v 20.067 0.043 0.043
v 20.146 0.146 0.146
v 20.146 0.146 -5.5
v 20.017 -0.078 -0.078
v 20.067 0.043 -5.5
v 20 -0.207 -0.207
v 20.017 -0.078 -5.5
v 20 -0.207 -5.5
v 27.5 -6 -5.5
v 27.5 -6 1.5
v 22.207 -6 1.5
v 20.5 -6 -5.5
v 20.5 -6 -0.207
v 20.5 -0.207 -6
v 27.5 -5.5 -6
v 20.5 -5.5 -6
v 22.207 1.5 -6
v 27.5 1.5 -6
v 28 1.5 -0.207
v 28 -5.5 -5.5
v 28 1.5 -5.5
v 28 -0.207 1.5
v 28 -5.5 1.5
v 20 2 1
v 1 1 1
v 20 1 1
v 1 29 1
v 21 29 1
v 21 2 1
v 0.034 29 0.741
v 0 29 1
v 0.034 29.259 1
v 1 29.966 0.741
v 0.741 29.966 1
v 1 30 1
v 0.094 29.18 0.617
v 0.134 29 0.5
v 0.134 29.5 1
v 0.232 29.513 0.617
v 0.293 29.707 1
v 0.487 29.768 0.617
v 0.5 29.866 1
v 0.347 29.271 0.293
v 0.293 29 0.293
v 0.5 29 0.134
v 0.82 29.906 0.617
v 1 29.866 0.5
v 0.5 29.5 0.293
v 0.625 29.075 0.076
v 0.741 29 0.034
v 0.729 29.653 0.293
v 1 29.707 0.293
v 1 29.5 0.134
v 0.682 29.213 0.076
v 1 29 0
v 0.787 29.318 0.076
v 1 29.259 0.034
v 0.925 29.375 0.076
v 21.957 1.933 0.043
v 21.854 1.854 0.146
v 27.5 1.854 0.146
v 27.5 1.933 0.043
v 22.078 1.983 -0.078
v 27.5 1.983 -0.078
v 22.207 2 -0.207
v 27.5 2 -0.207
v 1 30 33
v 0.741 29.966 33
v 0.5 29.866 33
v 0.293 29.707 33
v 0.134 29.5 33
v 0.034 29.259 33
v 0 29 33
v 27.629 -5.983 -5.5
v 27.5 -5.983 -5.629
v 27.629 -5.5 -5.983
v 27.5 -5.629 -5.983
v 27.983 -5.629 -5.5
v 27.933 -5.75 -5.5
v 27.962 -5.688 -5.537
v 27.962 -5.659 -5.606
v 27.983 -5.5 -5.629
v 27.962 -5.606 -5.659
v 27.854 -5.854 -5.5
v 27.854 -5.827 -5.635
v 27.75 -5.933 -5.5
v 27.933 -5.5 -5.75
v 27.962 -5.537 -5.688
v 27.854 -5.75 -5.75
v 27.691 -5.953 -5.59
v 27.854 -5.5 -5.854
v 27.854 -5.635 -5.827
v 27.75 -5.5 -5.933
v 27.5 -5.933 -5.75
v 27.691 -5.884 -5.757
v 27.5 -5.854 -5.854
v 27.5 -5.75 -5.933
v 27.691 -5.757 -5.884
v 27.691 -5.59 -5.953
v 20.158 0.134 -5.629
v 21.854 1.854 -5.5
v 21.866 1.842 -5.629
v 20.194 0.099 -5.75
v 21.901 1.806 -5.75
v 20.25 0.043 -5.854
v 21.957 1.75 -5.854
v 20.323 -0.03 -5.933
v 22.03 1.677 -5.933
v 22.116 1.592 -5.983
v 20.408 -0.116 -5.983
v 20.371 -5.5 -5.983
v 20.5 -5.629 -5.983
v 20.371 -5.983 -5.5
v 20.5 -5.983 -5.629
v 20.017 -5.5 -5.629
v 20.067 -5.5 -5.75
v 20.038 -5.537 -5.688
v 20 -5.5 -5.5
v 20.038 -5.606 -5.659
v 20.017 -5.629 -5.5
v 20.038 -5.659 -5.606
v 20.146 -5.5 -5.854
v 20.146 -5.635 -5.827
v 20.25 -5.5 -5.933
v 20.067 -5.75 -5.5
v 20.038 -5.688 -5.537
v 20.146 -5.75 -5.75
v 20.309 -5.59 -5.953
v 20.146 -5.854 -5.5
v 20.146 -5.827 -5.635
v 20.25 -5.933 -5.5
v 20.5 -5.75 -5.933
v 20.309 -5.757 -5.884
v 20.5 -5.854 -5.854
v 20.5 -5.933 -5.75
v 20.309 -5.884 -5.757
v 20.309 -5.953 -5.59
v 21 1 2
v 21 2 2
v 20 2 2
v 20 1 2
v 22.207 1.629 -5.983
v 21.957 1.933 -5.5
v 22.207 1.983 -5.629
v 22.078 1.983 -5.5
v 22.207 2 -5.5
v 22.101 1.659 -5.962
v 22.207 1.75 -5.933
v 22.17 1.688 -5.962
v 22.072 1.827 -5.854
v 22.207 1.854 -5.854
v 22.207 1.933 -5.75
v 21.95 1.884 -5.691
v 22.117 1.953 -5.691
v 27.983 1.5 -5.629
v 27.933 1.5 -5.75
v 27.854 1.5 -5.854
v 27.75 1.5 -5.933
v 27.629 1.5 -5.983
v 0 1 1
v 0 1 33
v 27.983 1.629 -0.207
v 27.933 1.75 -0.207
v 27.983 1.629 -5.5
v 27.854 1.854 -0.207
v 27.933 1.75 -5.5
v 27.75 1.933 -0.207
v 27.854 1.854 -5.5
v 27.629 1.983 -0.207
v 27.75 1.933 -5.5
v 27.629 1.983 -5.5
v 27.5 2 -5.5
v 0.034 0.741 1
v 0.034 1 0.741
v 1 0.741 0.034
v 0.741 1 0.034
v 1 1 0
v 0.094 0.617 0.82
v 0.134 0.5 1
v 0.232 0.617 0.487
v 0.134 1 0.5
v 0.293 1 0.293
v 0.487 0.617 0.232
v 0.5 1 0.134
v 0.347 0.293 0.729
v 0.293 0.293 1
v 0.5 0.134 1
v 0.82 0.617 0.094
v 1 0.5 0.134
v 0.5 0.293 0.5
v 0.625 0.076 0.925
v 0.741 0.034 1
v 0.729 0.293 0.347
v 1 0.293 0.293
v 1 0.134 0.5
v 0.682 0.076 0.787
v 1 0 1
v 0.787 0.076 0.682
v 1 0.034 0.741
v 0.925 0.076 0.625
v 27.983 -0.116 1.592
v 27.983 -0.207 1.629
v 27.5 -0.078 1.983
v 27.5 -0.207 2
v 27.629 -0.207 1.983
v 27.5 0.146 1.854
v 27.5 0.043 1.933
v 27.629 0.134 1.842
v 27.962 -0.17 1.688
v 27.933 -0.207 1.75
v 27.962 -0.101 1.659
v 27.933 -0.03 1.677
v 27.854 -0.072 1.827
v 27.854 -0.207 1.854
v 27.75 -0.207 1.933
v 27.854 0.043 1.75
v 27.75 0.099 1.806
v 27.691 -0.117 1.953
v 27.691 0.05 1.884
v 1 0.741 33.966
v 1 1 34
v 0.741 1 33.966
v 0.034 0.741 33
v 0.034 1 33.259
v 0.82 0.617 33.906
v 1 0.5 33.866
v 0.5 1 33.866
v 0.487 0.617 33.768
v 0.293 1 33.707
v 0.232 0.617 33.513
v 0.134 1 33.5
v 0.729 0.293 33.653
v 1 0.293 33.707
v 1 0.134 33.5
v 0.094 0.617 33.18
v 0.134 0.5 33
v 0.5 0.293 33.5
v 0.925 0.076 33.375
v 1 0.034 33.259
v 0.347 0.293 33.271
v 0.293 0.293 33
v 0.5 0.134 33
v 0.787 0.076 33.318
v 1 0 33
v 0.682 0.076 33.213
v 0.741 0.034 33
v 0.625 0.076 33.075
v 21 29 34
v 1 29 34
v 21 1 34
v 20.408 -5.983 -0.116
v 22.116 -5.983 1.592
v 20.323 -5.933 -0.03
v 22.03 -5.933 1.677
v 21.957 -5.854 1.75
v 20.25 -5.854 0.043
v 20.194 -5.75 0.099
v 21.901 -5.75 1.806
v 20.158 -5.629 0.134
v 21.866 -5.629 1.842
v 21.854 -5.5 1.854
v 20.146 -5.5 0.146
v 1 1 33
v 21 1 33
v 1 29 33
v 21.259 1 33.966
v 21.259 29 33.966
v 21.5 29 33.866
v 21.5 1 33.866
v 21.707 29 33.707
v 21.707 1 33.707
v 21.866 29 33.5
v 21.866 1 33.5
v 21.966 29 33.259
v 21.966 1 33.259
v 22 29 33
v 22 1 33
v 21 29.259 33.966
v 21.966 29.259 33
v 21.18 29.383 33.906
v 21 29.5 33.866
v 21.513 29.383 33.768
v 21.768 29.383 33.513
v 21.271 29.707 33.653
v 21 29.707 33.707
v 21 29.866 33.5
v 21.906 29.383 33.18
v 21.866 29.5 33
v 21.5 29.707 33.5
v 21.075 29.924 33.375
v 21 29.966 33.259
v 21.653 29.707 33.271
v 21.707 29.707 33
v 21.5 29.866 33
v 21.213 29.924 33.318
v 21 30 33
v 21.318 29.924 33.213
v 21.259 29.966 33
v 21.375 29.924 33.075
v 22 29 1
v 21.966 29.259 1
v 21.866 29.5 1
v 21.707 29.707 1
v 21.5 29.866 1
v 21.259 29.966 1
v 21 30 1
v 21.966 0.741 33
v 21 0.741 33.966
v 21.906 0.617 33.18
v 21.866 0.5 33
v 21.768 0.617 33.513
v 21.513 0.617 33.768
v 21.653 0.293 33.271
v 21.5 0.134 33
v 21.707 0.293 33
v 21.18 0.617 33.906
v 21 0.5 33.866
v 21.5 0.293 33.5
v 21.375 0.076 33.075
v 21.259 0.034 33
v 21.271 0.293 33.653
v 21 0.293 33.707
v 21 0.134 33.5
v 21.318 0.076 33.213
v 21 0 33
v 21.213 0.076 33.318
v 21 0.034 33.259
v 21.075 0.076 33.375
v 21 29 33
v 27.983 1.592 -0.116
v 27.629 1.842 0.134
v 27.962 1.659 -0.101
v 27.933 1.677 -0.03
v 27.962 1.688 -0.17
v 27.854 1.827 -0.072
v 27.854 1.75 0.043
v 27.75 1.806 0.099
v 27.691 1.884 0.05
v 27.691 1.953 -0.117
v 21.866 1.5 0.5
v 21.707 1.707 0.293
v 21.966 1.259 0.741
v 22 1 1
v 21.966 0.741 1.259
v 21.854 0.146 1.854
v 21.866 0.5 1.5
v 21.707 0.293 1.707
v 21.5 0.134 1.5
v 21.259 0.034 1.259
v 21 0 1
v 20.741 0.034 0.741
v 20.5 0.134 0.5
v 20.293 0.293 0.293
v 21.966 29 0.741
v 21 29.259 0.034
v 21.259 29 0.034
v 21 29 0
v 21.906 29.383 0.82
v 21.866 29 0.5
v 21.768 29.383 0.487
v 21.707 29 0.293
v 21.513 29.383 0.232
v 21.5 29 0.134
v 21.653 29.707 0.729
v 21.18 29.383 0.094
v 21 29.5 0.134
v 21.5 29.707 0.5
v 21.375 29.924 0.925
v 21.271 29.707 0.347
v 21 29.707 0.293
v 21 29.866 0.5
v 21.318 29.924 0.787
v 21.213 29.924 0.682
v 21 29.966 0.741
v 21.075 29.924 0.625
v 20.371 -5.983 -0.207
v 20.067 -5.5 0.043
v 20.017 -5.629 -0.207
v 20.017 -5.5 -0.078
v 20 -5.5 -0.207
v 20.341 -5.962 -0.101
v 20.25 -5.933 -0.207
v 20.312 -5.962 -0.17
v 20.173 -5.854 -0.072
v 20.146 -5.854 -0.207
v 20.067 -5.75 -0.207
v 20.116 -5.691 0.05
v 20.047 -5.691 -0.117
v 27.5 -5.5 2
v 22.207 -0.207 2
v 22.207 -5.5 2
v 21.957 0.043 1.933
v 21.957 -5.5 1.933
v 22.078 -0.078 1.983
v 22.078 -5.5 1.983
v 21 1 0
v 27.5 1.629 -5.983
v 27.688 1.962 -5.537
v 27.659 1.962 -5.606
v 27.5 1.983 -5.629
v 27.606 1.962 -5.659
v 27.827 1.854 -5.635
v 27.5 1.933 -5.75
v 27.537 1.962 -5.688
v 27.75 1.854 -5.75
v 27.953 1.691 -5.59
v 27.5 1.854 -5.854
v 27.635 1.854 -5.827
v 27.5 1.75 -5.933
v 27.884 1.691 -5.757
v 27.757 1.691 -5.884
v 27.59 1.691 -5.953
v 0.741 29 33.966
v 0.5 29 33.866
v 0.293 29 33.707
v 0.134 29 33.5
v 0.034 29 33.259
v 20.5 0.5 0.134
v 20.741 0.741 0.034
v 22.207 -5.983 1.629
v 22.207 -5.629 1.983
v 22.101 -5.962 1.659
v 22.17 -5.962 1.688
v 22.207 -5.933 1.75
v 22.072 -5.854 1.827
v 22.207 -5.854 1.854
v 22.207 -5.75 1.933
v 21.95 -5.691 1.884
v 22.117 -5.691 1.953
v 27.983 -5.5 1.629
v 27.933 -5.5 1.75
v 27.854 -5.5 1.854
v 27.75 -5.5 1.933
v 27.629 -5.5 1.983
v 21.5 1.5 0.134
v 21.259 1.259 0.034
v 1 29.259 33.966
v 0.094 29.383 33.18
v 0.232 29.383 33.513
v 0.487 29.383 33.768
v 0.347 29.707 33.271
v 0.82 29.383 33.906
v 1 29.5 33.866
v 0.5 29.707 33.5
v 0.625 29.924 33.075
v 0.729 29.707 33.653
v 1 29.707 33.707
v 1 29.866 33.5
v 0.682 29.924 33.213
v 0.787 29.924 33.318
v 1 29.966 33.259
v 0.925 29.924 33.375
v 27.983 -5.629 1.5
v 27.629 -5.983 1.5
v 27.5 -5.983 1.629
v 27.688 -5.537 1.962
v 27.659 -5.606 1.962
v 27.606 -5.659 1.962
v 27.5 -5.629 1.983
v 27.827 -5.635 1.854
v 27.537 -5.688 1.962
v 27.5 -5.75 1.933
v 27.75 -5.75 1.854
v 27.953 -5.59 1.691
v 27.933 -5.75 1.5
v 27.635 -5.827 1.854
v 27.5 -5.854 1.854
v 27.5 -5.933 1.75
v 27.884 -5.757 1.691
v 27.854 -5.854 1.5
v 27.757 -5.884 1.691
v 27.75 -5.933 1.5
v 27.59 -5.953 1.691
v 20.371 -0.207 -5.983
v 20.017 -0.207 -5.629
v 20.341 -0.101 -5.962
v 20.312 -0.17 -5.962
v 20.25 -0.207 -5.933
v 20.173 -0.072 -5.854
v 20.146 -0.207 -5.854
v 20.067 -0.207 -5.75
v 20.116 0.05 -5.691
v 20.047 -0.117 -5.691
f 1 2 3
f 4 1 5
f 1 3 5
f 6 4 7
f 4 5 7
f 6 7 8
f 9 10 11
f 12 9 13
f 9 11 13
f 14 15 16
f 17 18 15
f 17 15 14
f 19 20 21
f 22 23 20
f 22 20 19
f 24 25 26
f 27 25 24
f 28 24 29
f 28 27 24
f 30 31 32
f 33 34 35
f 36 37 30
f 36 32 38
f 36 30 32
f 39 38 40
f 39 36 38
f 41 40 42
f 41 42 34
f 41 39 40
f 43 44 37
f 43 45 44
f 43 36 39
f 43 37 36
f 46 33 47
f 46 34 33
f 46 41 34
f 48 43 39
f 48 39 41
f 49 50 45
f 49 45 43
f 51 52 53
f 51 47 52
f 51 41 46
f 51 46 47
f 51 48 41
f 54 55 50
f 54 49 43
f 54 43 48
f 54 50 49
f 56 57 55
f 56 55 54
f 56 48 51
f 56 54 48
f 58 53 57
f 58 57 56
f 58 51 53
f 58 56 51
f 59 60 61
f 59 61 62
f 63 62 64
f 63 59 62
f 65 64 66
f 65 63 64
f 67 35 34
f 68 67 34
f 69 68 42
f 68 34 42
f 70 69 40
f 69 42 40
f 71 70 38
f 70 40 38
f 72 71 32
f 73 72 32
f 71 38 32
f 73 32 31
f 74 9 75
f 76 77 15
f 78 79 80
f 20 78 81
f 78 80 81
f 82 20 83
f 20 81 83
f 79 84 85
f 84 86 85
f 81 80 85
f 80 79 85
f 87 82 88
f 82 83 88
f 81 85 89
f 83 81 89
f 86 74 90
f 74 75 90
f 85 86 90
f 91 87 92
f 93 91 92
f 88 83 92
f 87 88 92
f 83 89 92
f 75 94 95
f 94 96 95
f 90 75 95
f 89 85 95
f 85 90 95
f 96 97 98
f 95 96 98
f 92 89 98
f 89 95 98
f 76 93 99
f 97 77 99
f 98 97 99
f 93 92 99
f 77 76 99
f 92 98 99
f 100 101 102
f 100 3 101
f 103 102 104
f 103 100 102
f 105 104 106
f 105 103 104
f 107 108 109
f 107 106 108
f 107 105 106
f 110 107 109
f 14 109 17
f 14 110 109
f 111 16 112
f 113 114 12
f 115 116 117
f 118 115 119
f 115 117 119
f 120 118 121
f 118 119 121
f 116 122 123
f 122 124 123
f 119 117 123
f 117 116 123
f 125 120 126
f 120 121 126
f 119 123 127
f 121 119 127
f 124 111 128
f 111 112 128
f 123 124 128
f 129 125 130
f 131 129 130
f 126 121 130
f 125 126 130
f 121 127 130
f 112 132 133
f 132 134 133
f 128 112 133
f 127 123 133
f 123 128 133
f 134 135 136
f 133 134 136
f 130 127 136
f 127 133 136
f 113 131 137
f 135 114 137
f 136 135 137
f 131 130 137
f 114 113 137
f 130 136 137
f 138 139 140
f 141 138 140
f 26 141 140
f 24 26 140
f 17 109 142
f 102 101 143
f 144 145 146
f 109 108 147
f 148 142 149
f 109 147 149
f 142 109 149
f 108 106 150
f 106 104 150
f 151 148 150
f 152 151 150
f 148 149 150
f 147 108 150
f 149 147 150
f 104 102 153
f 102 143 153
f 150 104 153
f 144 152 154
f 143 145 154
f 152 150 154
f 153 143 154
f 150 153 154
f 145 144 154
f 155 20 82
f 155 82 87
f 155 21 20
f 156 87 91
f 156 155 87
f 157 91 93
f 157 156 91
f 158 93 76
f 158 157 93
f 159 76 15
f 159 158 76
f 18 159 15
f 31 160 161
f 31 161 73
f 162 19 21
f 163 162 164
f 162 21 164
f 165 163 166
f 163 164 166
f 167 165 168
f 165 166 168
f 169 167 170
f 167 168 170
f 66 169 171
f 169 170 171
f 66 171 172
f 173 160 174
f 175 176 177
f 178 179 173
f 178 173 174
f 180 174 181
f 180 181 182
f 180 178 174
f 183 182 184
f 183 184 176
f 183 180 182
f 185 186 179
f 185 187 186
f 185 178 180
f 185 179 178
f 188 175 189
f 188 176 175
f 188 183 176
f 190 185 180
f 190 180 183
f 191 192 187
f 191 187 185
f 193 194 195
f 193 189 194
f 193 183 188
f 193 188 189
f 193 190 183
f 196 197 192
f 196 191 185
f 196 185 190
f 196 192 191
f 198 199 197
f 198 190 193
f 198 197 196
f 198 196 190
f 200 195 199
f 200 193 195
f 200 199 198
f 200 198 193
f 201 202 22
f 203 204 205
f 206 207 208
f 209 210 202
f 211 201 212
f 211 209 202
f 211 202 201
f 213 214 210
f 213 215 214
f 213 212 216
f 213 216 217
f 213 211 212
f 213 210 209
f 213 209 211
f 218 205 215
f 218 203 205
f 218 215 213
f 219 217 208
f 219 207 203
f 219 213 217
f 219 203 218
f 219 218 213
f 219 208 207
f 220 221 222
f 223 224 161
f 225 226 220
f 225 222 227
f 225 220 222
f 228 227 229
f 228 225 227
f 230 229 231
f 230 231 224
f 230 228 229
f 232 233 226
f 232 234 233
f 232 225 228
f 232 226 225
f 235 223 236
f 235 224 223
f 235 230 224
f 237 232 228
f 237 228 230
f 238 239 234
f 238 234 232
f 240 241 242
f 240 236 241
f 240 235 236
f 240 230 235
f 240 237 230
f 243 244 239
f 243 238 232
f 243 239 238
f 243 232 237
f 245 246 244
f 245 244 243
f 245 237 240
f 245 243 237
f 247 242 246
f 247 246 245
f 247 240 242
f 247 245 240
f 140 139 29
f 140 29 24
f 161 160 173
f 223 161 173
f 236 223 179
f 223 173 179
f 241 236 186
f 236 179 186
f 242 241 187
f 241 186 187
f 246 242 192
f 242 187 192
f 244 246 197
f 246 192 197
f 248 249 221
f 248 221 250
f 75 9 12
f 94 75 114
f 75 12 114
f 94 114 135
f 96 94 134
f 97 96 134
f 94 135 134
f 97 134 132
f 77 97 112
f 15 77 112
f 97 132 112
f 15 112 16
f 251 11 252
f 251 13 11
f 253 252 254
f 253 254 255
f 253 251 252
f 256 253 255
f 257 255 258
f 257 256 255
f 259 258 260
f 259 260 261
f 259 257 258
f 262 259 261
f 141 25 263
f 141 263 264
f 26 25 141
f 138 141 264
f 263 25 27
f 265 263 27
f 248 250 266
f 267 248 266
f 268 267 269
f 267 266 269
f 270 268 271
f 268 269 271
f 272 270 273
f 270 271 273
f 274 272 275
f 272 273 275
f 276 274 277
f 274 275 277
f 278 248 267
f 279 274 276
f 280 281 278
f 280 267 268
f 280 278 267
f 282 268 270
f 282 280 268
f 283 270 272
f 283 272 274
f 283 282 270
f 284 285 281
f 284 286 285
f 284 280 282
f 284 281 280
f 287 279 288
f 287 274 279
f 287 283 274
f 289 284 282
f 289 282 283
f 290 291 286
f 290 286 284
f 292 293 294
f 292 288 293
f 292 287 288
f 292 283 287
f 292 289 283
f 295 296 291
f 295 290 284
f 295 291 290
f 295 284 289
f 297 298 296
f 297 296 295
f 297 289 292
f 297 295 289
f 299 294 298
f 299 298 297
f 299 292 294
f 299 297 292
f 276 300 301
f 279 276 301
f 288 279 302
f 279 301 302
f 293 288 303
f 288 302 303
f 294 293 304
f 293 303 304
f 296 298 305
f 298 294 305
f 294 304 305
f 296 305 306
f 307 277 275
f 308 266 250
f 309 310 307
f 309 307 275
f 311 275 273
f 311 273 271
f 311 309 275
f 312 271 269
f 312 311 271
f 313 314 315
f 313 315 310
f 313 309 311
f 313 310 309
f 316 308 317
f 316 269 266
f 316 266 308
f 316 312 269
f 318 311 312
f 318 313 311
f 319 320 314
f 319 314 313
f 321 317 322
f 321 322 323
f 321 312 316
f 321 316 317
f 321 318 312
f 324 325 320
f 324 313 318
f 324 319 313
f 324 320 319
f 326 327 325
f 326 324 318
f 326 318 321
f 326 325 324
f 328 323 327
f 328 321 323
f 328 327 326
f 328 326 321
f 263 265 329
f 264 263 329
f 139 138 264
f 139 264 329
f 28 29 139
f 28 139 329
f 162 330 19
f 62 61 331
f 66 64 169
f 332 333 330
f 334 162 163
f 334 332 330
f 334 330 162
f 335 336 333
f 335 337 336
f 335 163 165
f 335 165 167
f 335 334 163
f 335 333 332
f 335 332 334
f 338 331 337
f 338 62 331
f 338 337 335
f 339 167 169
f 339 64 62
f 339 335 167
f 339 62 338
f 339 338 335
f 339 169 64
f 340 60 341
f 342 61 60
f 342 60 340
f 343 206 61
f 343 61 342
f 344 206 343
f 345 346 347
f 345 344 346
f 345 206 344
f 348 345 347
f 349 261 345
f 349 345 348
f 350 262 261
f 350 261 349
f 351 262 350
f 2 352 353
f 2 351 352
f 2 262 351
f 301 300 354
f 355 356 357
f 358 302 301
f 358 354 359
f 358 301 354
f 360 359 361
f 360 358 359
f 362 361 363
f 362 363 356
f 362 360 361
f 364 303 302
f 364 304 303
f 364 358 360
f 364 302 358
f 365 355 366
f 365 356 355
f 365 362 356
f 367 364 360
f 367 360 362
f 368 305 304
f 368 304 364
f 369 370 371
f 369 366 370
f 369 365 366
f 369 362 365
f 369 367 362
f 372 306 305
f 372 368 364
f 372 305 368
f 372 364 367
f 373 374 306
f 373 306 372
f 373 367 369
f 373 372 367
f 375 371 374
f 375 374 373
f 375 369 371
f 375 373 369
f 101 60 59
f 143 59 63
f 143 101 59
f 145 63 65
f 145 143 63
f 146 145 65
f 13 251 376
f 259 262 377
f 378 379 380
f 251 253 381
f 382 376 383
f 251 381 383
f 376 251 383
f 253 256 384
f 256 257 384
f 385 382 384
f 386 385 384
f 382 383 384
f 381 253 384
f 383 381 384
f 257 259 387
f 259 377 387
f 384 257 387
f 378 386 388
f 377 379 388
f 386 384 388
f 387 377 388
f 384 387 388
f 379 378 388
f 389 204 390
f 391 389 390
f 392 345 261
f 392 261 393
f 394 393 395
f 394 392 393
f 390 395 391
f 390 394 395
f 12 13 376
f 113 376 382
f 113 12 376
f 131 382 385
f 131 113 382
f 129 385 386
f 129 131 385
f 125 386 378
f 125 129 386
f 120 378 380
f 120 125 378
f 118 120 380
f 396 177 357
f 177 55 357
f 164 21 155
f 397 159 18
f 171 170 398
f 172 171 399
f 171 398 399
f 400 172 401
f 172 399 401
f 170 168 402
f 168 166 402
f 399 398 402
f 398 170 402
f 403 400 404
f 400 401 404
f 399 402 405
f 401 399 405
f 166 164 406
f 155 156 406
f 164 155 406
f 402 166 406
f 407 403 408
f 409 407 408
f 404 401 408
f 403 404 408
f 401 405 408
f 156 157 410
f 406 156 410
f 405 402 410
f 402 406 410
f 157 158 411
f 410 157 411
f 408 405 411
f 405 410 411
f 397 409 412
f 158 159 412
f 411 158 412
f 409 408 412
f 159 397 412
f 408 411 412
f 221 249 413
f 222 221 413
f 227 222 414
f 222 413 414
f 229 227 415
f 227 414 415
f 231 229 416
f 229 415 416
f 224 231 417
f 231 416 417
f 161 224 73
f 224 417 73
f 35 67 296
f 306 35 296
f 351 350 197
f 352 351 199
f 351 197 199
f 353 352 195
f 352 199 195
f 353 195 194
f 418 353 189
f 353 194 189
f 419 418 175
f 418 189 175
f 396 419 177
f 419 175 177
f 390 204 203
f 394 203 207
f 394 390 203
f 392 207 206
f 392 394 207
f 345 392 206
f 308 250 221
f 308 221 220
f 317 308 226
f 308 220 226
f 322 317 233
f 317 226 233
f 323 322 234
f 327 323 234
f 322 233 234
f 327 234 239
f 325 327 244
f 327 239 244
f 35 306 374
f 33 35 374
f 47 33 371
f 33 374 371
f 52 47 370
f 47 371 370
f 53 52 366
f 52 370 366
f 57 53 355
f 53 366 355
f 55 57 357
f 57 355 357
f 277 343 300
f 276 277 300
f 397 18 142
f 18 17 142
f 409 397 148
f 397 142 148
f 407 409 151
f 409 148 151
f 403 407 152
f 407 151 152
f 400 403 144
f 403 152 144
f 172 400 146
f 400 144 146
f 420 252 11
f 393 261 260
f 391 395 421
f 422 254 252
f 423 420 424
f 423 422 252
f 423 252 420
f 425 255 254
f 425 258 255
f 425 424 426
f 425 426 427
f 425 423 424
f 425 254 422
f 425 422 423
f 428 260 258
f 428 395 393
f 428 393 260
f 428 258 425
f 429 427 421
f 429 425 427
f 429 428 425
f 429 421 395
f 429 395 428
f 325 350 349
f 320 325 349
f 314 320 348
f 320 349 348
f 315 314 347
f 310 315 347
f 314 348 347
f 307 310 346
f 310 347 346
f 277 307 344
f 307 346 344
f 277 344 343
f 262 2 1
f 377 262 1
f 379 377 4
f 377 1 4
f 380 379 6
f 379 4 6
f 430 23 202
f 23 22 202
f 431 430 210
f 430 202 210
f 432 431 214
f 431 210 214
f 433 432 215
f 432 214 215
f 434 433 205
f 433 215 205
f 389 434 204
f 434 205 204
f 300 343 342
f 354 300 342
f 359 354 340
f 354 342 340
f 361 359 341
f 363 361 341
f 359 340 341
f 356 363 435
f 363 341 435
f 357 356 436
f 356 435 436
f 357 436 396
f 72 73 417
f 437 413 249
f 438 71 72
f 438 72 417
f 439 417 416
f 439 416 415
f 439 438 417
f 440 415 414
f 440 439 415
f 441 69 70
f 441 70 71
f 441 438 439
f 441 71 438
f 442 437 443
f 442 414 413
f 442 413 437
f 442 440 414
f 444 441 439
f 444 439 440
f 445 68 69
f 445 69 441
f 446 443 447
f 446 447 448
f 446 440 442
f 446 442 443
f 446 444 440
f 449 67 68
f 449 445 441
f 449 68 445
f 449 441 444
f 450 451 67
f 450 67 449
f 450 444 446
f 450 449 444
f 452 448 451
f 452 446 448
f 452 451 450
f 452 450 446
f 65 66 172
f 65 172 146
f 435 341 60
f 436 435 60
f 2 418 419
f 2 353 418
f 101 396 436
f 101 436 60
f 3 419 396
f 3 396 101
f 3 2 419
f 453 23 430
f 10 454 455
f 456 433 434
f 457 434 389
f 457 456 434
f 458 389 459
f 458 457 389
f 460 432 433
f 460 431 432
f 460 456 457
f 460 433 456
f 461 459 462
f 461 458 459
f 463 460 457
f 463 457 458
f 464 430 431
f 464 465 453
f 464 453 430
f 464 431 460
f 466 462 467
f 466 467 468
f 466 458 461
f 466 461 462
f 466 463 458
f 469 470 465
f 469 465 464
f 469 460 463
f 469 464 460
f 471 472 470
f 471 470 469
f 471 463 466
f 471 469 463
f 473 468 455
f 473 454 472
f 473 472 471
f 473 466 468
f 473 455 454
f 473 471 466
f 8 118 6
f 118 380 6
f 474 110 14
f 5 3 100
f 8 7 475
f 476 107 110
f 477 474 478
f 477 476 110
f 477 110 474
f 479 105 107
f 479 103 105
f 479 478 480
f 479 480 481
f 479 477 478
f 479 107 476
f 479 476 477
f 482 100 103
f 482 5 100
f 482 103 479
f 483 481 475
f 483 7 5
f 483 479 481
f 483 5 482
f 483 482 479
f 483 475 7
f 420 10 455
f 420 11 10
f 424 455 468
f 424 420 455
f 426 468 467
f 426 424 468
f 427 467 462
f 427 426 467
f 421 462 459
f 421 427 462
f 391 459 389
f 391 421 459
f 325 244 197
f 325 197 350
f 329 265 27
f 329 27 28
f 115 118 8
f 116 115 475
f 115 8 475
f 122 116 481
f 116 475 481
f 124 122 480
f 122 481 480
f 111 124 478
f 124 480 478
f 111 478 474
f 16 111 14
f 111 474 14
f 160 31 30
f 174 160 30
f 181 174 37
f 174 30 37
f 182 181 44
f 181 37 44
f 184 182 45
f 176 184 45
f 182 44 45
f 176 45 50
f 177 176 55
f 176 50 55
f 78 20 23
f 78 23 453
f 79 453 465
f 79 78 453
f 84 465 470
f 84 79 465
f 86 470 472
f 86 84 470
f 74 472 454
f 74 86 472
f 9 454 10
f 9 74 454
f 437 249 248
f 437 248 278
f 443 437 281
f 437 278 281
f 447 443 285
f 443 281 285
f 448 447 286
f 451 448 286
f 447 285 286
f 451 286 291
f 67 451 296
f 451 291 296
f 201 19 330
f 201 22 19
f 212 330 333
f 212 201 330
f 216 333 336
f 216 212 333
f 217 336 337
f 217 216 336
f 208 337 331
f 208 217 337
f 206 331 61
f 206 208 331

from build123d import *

# Parameters (mm, degrees)
SKETCH1_W                = 22
SKETCH1_H                = 30
BOSS_EXTRUDE1_DEPTH      = 34
SHELL1_T                 = 1
BOSS_EXTRUDE3_DEPTH      = 6
BOSS_EXTRUDE3_DEPTH_BACK = 2
SKETCH2_W                = 8
SKETCH2_H                = 8
CHAMFER2_SIZE            = 2
FILLET1_R                = 1
FILLET2_R                = 0.5


with BuildPart() as part:
    # Sketch1 → Boss-Extrude1 (new body)
    with BuildSketch(Plane.XY):
        with Locations((11, 15)):
            Rectangle(SKETCH1_W, SKETCH1_H)
    extrude(amount=BOSS_EXTRUDE1_DEPTH)

    # Shell1 (no face opened: a closed hollow body)
    add(offset(amount=-SHELL1_T, mode=Mode.PRIVATE), mode=Mode.SUBTRACT)

    # Sketch2 → Boss-Extrude3 (add, two sides: drawn at the far end of the back side and taken through both)
    with BuildSketch(Plane(origin=(0, 0, 0), x_dir=(-1, 0, 0), z_dir=(0, 0, -1)).offset(-BOSS_EXTRUDE3_DEPTH_BACK)):
        with Locations((-24, -2)):
            Rectangle(SKETCH2_W, SKETCH2_H)
    extrude(amount=BOSS_EXTRUDE3_DEPTH + BOSS_EXTRUDE3_DEPTH_BACK)

    # Chamfer2
    chamfer2_edges = [part.edges().sort_by_distance(p)[0] for p in [
        (20, -3, 2),
        (20, 2, -3),
        (25, 2, 2),
    ]]
    chamfer(chamfer2_edges, length=CHAMFER2_SIZE)

    # Fillet1
    # the kernel refuses this fillet: 1 mm, written as the material it takes off along each edge
    with BuildSketch(Plane(origin=(1, 29, 1), x_dir=(0, 1, 0), z_dir=(0, 0, -1))) as fillet1_piece_1_section:
        Polygon((0, 0), (FILLET1_R, 0), (FILLET1_R, -FILLET1_R), (0, -FILLET1_R), align=None)
    fillet1_piece_1 = extrude(amount=FILLET1_R, mode=Mode.PRIVATE)
    fillet1_piece_1 = fillet1_piece_1 - Plane(origin=(1, 29, 1), x_dir=(0.7071067811865475, -0.7071067811865475, 0), z_dir=(0, 0, -1)) * Sphere(FILLET1_R, mode=Mode.PRIVATE)
    add(fillet1_piece_1, mode=Mode.SUBTRACT)
    with BuildSketch(Plane(origin=(1, 1, 1), x_dir=(0, 0, -1), z_dir=(0, -1, 0))) as fillet1_piece_2_section:
        Polygon((0, 0), (FILLET1_R, 0), (FILLET1_R, -FILLET1_R), (0, -FILLET1_R), align=None)
    fillet1_piece_2 = extrude(amount=FILLET1_R, mode=Mode.PRIVATE)
    fillet1_piece_2 = fillet1_piece_2 - Plane(origin=(1, 1, 1), x_dir=(0.7071067811865475, 0, 0.7071067811865475), z_dir=(0, -1, 0)) * Sphere(FILLET1_R, mode=Mode.PRIVATE)
    add(fillet1_piece_2, mode=Mode.SUBTRACT)
    with BuildSketch(Plane(origin=(21, 29, 1), x_dir=(0, 0, -1), z_dir=(0, 1, 0))) as fillet1_piece_3_section:
        Polygon((0, 0), (FILLET1_R, 0), (FILLET1_R, -FILLET1_R), (0, -FILLET1_R), align=None)
    fillet1_piece_3 = extrude(amount=FILLET1_R, mode=Mode.PRIVATE)
    fillet1_piece_3 = fillet1_piece_3 - Plane(origin=(21, 29, 1), x_dir=(-0.7071067811865475, 0, 0.7071067811865475), z_dir=(0, 1, 0)) * Sphere(FILLET1_R, mode=Mode.PRIVATE)
    add(fillet1_piece_3, mode=Mode.SUBTRACT)
    with BuildSketch(Plane(origin=(1, 1, 33), x_dir=(-1, 0, 0), z_dir=(0, -1, 0))) as fillet1_piece_4_section:
        Polygon((0, 0), (FILLET1_R, 0), (FILLET1_R, -FILLET1_R), (0, -FILLET1_R), align=None)
    fillet1_piece_4 = extrude(amount=FILLET1_R, mode=Mode.PRIVATE)
    fillet1_piece_4 = fillet1_piece_4 - Plane(origin=(1, 1, 33), x_dir=(0.7071067811865475, 0, -0.7071067811865475), z_dir=(0, -1, 0)) * Sphere(FILLET1_R, mode=Mode.PRIVATE)
    add(fillet1_piece_4, mode=Mode.SUBTRACT)
    with BuildSketch(Plane(origin=(21, 1, 33), x_dir=(1, 0, 0), z_dir=(0, -1, 0))) as fillet1_piece_5_section:
        Polygon((0, 0), (FILLET1_R, 0), (FILLET1_R, FILLET1_R), (0, FILLET1_R), align=None)
    fillet1_piece_5 = extrude(amount=FILLET1_R, mode=Mode.PRIVATE)
    fillet1_piece_5 = fillet1_piece_5 - Plane(origin=(21, 1, 33), x_dir=(-0.7071067811865475, 0, -0.7071067811865475), z_dir=(0, -1, 0)) * Sphere(FILLET1_R, mode=Mode.PRIVATE)
    add(fillet1_piece_5, mode=Mode.SUBTRACT)
    with BuildSketch(Plane(origin=(21, 29, 33), x_dir=(1, 0, 0), z_dir=(0, 1, 0))) as fillet1_piece_6_section:
        Polygon((0, 0), (FILLET1_R, 0), (FILLET1_R, -FILLET1_R), (0, -FILLET1_R), align=None)
    fillet1_piece_6 = extrude(amount=FILLET1_R, mode=Mode.PRIVATE)
    fillet1_piece_6 = fillet1_piece_6 - Plane(origin=(21, 29, 33), x_dir=(-0.7071067811865475, 0, -0.7071067811865475), z_dir=(0, 1, 0)) * Sphere(FILLET1_R, mode=Mode.PRIVATE)
    add(fillet1_piece_6, mode=Mode.SUBTRACT)
    with BuildSketch(Plane(origin=(1, 29, 33), x_dir=(-1, 0, 0), z_dir=(0, 1, 0))) as fillet1_piece_7_section:
        Polygon((0, 0), (FILLET1_R, 0), (FILLET1_R, FILLET1_R), (0, FILLET1_R), align=None)
    fillet1_piece_7 = extrude(amount=FILLET1_R, mode=Mode.PRIVATE)
    fillet1_piece_7 = fillet1_piece_7 - Plane(origin=(1, 29, 33), x_dir=(0.7071067811865475, 0, -0.7071067811865475), z_dir=(0, 1, 0)) * Sphere(FILLET1_R, mode=Mode.PRIVATE)
    add(fillet1_piece_7, mode=Mode.SUBTRACT)
    with BuildSketch(Plane(origin=(0, 29, 0), x_dir=(1, 0, 0), z_dir=(0, -1, 0)), Plane(origin=(22, 1, 34), x_dir=(0, 0, -1), z_dir=(0, 1, 0)), Plane(origin=(0, 29, 34), x_dir=(0, 0, -1), z_dir=(0, -1, 0))) as fillet1_piece_8:
        with BuildLine():
            CenterArc((FILLET1_R, FILLET1_R), FILLET1_R, 180, 90)
            Line((0, FILLET1_R), (0, 0))
            Line((0, 0), (FILLET1_R, 0))
        make_face()
    extrude(amount=28, mode=Mode.SUBTRACT)
    with BuildSketch(Plane(origin=(1, 0, 0), x_dir=(0, 0, 1), z_dir=(1, 0, 0))) as fillet1_piece_9_section:
        with BuildLine():
            CenterArc((FILLET1_R, -FILLET1_R), FILLET1_R, 90, 90)
            Line((0, -FILLET1_R), (0, 0))
            Line((0, 0), (FILLET1_R, 0))
        make_face()
    fillet1_piece_9 = extrude(amount=21.5, mode=Mode.PRIVATE)
    fillet1_piece_9 = split(fillet1_piece_9, bisect_by=Plane(origin=(15.381840504, 0.226418621, -4.618159496), z_dir=(-0.7071067811865476, 0, 0.7071067811865476)), keep=Keep.TOP, mode=Mode.PRIVATE)
    fillet1_piece_9 = split(fillet1_piece_9, bisect_by=Plane(origin=(15.381840504, -4.618159496, 0.226418621), z_dir=(-0.7071067811865475, 0.7071067811865476, 0)), keep=Keep.TOP, mode=Mode.PRIVATE)
    add(fillet1_piece_9, mode=Mode.SUBTRACT)
    with BuildSketch(Plane(origin=(1, 0, 0), x_dir=(0, 0, 1), z_dir=(1, 0, 0))) as fillet1_piece_10_section:
        with BuildLine():
            CenterArc((FILLET1_R, -FILLET1_R), FILLET1_R, 90, 90)
            Line((0, -FILLET1_R), (0, 0))
            Line((0, 0), (FILLET1_R, 0))
        make_face()
    fillet1_piece_10 = extrude(amount=21.5, mode=Mode.PRIVATE)
    fillet1_piece_10 = split(fillet1_piece_10, bisect_by=Plane(origin=(20.16446835, 0.528927527, 0.16446835), z_dir=(0.7071067811865476, 0, -0.7071067811865476)), keep=Keep.TOP, mode=Mode.PRIVATE)
    fillet1_piece_10 = split(fillet1_piece_10, bisect_by=Plane(origin=(20.407441135, 0.407441135, 0.042981958), z_dir=(-0.7071067811865475, 0.7071067811865476, 0)), keep=Keep.TOP, mode=Mode.PRIVATE)
    add(fillet1_piece_10, mode=Mode.SUBTRACT)
    with BuildSketch(Plane(origin=(1, 0, 0), x_dir=(0, 0, 1), z_dir=(1, 0, 0))) as fillet1_piece_11_section:
        with BuildLine():
            CenterArc((FILLET1_R, -FILLET1_R), FILLET1_R, 90, 90)
            Line((0, -FILLET1_R), (0, 0))
            Line((0, 0), (FILLET1_R, 0))
        make_face()
    fillet1_piece_11 = extrude(amount=21.5, mode=Mode.PRIVATE)
    fillet1_piece_11 = split(fillet1_piece_11, bisect_by=Plane(origin=(20.407441135, 0.042981958, 0.407441135), z_dir=(-0.7071067811865476, 0, 0.7071067811865476)), keep=Keep.TOP, mode=Mode.PRIVATE)
    fillet1_piece_11 = split(fillet1_piece_11, bisect_by=Plane(origin=(20.16446835, 0.16446835, 0.528927527), z_dir=(0.7071067811865475, -0.7071067811865476, 0)), keep=Keep.TOP, mode=Mode.PRIVATE)
    add(fillet1_piece_11, mode=Mode.SUBTRACT)
    with BuildSketch(Plane(origin=(22, -0.5, 0), x_dir=(-1, 0, 0), z_dir=(0, 1, 0))) as fillet1_piece_12_section:
        with BuildLine():
            CenterArc((FILLET1_R, FILLET1_R), FILLET1_R, 180, 90)
            Line((0, FILLET1_R), (0, 0))
            Line((0, 0), (FILLET1_R, 0))
        make_face()
    fillet1_piece_12 = extrude(amount=29.5, mode=Mode.PRIVATE)
    fillet1_piece_12 = split(fillet1_piece_12, bisect_by=Plane(origin=(21.83553165, 1.83553165, 0.528927527), z_dir=(0.7071067811865475, -0.7071067811865476, 0)), keep=Keep.TOP, mode=Mode.PRIVATE)
    fillet1_piece_12 = split(fillet1_piece_12, bisect_by=Plane(origin=(21.957018042, 1.592558865, 0.407441135), z_dir=(0, 0.7071067811865476, 0.7071067811865476)), keep=Keep.TOP, mode=Mode.PRIVATE)
    add(fillet1_piece_12, mode=Mode.SUBTRACT)
    with BuildSketch(Plane(origin=(22, -0.5, 0), x_dir=(-1, 0, 0), z_dir=(0, 1, 0))) as fillet1_piece_13_section:
        with BuildLine():
            CenterArc((FILLET1_R, FILLET1_R), FILLET1_R, 180, 90)
            Line((0, FILLET1_R), (0, 0))
            Line((0, 0), (FILLET1_R, 0))
        make_face()
    fillet1_piece_13 = extrude(amount=29.5, mode=Mode.PRIVATE)
    fillet1_piece_13 = split(fillet1_piece_13, bisect_by=Plane(origin=(21.592558865, 1.592558865, 0.042981958), z_dir=(-0.7071067811865475, 0.7071067811865476, 0)), keep=Keep.TOP, mode=Mode.PRIVATE)
    fillet1_piece_13 = split(fillet1_piece_13, bisect_by=Plane(origin=(21.471072473, 1.83553165, 0.16446835), z_dir=(0, -0.7071067811865476, -0.7071067811865476)), keep=Keep.TOP, mode=Mode.PRIVATE)
    add(fillet1_piece_13, mode=Mode.SUBTRACT)
    with BuildSketch(Plane(origin=(22, -0.5, 0), x_dir=(-1, 0, 0), z_dir=(0, 1, 0))) as fillet1_piece_14_section:
        with BuildLine():
            CenterArc((FILLET1_R, FILLET1_R), FILLET1_R, 180, 90)
            Line((0, FILLET1_R), (0, 0))
            Line((0, 0), (FILLET1_R, 0))
        make_face()
    fillet1_piece_14 = extrude(amount=29.5, mode=Mode.PRIVATE)
    fillet1_piece_14 = split(fillet1_piece_14, bisect_by=Plane(origin=(28.618183131, 8.618183131, 0.226411675), z_dir=(-0.7071067811865475, 0.7071067811865476, 0)), keep=Keep.TOP, mode=Mode.PRIVATE)
    fillet1_piece_14 = split(fillet1_piece_14, bisect_by=Plane(origin=(21.773588325, 8.618183131, -6.618183131), z_dir=(0, 0.7071067811865476, 0.7071067811865476)), keep=Keep.TOP, mode=Mode.PRIVATE)
    add(fillet1_piece_14, mode=Mode.SUBTRACT)
    with BuildSketch(Plane(origin=(21, 30, 0), x_dir=(0, -1, 0), z_dir=(-1, 0, 0)), Plane(origin=(1, 0, 34), x_dir=(0, 0, -1), z_dir=(1, 0, 0))) as fillet1_piece_15:
        with BuildLine():
            CenterArc((FILLET1_R, FILLET1_R), FILLET1_R, 180, 90)
            Line((0, FILLET1_R), (0, 0))
            Line((0, 0), (FILLET1_R, 0))
        make_face()
    extrude(amount=20, mode=Mode.SUBTRACT)
    with BuildSketch(Plane(origin=(21, 30, 34), x_dir=(0, -1, 0), z_dir=(-1, 0, 0))) as fillet1_piece_16:
        with BuildLine():
            CenterArc((FILLET1_R, -FILLET1_R), FILLET1_R, 90, 90)
            Line((0, -FILLET1_R), (0, 0))
            Line((0, 0), (FILLET1_R, 0))
        make_face()
    extrude(amount=20, mode=Mode.SUBTRACT)
    with BuildSketch(Plane(origin=(0, 30, 1), x_dir=(0, -1, 0), z_dir=(0, 0, 1)), Plane(origin=(0, 0, 1), x_dir=(1, 0, 0), z_dir=(0, 0, 1))) as fillet1_piece_17:
        with BuildLine():
            CenterArc((FILLET1_R, FILLET1_R), FILLET1_R, 180, 90)
            Line((0, FILLET1_R), (0, 0))
            Line((0, 0), (FILLET1_R, 0))
        make_face()
    extrude(amount=32, mode=Mode.SUBTRACT)
    with BuildSketch(Plane(origin=(22, 30, 1), x_dir=(0, -1, 0), z_dir=(0, 0, 1))) as fillet1_piece_18:
        with BuildLine():
            CenterArc((FILLET1_R, -FILLET1_R), FILLET1_R, 90, 90)
            Line((0, -FILLET1_R), (0, 0))
            Line((0, 0), (FILLET1_R, 0))
        make_face()
    extrude(amount=32, mode=Mode.SUBTRACT)
    with BuildSketch(Plane(origin=(22, 0, -0.5), x_dir=(-1, 0, 0), z_dir=(0, 0, 1))) as fillet1_piece_19_section:
        with BuildLine():
            CenterArc((FILLET1_R, -FILLET1_R), FILLET1_R, 90, 90)
            Line((0, -FILLET1_R), (0, 0))
            Line((0, 0), (FILLET1_R, 0))
        make_face()
    fillet1_piece_19 = extrude(amount=33.5, mode=Mode.PRIVATE)
    fillet1_piece_19 = split(fillet1_piece_19, bisect_by=Plane(origin=(21.83553165, 0.528927527, 1.83553165), z_dir=(0.7071067811865476, 0, -0.7071067811865476)), keep=Keep.TOP, mode=Mode.PRIVATE)
    fillet1_piece_19 = split(fillet1_piece_19, bisect_by=Plane(origin=(21.957018042, 0.407441135, 1.592558865), z_dir=(0, 0.7071067811865476, 0.7071067811865476)), keep=Keep.TOP, mode=Mode.PRIVATE)
    add(fillet1_piece_19, mode=Mode.SUBTRACT)
    with BuildSketch(Plane(origin=(22, 0, -0.5), x_dir=(-1, 0, 0), z_dir=(0, 0, 1))) as fillet1_piece_20_section:
        with BuildLine():
            CenterArc((FILLET1_R, -FILLET1_R), FILLET1_R, 90, 90)
            Line((0, -FILLET1_R), (0, 0))
            Line((0, 0), (FILLET1_R, 0))
        make_face()
    fillet1_piece_20 = extrude(amount=33.5, mode=Mode.PRIVATE)
    fillet1_piece_20 = split(fillet1_piece_20, bisect_by=Plane(origin=(21.592558865, 0.042981958, 1.592558865), z_dir=(-0.7071067811865476, 0, 0.7071067811865476)), keep=Keep.TOP, mode=Mode.PRIVATE)
    fillet1_piece_20 = split(fillet1_piece_20, bisect_by=Plane(origin=(21.471072473, 0.16446835, 1.83553165), z_dir=(0, -0.7071067811865476, -0.7071067811865476)), keep=Keep.TOP, mode=Mode.PRIVATE)
    add(fillet1_piece_20, mode=Mode.SUBTRACT)
    with BuildSketch(Plane(origin=(22, 0, -0.5), x_dir=(-1, 0, 0), z_dir=(0, 0, 1))) as fillet1_piece_21_section:
        with BuildLine():
            CenterArc((FILLET1_R, -FILLET1_R), FILLET1_R, 90, 90)
            Line((0, -FILLET1_R), (0, 0))
            Line((0, 0), (FILLET1_R, 0))
        make_face()
    fillet1_piece_21 = extrude(amount=33.5, mode=Mode.PRIVATE)
    fillet1_piece_21 = split(fillet1_piece_21, bisect_by=Plane(origin=(29.618190384, 0.226409543, 9.618190384), z_dir=(-0.7071067811865476, 0, 0.7071067811865476)), keep=Keep.TOP, mode=Mode.PRIVATE)
    fillet1_piece_21 = split(fillet1_piece_21, bisect_by=Plane(origin=(21.773590457, -7.618190384, 9.618190384), z_dir=(0, 0.7071067811865476, 0.7071067811865476)), keep=Keep.TOP, mode=Mode.PRIVATE)
    add(fillet1_piece_21, mode=Mode.SUBTRACT)

    # Fillet2
    fillet2_edges = [part.edges().sort_by_distance(p)[0] for p in [
        (24, -6, -6),
        (28, -6, -2),
        (28, -2, -6),
        (28, 2, -3),
        (25, 2, -6),
        (22, 2, -3),
        (25, 2, 0),
        (28, -3, 2),
        (28, 1, 1),
        (25, -6, 2),
        (22, -3, 2),
        (25, 0, 2),
        (20, -3, -6),
        (20, -6, -3),
        (20, -3, 0),
        (20, 0, -3),
        (21, 1, -6),
        (21, -6, 1),
    ]]
    fillet(fillet2_edges, radius=FILLET2_R)


solid = part.part
